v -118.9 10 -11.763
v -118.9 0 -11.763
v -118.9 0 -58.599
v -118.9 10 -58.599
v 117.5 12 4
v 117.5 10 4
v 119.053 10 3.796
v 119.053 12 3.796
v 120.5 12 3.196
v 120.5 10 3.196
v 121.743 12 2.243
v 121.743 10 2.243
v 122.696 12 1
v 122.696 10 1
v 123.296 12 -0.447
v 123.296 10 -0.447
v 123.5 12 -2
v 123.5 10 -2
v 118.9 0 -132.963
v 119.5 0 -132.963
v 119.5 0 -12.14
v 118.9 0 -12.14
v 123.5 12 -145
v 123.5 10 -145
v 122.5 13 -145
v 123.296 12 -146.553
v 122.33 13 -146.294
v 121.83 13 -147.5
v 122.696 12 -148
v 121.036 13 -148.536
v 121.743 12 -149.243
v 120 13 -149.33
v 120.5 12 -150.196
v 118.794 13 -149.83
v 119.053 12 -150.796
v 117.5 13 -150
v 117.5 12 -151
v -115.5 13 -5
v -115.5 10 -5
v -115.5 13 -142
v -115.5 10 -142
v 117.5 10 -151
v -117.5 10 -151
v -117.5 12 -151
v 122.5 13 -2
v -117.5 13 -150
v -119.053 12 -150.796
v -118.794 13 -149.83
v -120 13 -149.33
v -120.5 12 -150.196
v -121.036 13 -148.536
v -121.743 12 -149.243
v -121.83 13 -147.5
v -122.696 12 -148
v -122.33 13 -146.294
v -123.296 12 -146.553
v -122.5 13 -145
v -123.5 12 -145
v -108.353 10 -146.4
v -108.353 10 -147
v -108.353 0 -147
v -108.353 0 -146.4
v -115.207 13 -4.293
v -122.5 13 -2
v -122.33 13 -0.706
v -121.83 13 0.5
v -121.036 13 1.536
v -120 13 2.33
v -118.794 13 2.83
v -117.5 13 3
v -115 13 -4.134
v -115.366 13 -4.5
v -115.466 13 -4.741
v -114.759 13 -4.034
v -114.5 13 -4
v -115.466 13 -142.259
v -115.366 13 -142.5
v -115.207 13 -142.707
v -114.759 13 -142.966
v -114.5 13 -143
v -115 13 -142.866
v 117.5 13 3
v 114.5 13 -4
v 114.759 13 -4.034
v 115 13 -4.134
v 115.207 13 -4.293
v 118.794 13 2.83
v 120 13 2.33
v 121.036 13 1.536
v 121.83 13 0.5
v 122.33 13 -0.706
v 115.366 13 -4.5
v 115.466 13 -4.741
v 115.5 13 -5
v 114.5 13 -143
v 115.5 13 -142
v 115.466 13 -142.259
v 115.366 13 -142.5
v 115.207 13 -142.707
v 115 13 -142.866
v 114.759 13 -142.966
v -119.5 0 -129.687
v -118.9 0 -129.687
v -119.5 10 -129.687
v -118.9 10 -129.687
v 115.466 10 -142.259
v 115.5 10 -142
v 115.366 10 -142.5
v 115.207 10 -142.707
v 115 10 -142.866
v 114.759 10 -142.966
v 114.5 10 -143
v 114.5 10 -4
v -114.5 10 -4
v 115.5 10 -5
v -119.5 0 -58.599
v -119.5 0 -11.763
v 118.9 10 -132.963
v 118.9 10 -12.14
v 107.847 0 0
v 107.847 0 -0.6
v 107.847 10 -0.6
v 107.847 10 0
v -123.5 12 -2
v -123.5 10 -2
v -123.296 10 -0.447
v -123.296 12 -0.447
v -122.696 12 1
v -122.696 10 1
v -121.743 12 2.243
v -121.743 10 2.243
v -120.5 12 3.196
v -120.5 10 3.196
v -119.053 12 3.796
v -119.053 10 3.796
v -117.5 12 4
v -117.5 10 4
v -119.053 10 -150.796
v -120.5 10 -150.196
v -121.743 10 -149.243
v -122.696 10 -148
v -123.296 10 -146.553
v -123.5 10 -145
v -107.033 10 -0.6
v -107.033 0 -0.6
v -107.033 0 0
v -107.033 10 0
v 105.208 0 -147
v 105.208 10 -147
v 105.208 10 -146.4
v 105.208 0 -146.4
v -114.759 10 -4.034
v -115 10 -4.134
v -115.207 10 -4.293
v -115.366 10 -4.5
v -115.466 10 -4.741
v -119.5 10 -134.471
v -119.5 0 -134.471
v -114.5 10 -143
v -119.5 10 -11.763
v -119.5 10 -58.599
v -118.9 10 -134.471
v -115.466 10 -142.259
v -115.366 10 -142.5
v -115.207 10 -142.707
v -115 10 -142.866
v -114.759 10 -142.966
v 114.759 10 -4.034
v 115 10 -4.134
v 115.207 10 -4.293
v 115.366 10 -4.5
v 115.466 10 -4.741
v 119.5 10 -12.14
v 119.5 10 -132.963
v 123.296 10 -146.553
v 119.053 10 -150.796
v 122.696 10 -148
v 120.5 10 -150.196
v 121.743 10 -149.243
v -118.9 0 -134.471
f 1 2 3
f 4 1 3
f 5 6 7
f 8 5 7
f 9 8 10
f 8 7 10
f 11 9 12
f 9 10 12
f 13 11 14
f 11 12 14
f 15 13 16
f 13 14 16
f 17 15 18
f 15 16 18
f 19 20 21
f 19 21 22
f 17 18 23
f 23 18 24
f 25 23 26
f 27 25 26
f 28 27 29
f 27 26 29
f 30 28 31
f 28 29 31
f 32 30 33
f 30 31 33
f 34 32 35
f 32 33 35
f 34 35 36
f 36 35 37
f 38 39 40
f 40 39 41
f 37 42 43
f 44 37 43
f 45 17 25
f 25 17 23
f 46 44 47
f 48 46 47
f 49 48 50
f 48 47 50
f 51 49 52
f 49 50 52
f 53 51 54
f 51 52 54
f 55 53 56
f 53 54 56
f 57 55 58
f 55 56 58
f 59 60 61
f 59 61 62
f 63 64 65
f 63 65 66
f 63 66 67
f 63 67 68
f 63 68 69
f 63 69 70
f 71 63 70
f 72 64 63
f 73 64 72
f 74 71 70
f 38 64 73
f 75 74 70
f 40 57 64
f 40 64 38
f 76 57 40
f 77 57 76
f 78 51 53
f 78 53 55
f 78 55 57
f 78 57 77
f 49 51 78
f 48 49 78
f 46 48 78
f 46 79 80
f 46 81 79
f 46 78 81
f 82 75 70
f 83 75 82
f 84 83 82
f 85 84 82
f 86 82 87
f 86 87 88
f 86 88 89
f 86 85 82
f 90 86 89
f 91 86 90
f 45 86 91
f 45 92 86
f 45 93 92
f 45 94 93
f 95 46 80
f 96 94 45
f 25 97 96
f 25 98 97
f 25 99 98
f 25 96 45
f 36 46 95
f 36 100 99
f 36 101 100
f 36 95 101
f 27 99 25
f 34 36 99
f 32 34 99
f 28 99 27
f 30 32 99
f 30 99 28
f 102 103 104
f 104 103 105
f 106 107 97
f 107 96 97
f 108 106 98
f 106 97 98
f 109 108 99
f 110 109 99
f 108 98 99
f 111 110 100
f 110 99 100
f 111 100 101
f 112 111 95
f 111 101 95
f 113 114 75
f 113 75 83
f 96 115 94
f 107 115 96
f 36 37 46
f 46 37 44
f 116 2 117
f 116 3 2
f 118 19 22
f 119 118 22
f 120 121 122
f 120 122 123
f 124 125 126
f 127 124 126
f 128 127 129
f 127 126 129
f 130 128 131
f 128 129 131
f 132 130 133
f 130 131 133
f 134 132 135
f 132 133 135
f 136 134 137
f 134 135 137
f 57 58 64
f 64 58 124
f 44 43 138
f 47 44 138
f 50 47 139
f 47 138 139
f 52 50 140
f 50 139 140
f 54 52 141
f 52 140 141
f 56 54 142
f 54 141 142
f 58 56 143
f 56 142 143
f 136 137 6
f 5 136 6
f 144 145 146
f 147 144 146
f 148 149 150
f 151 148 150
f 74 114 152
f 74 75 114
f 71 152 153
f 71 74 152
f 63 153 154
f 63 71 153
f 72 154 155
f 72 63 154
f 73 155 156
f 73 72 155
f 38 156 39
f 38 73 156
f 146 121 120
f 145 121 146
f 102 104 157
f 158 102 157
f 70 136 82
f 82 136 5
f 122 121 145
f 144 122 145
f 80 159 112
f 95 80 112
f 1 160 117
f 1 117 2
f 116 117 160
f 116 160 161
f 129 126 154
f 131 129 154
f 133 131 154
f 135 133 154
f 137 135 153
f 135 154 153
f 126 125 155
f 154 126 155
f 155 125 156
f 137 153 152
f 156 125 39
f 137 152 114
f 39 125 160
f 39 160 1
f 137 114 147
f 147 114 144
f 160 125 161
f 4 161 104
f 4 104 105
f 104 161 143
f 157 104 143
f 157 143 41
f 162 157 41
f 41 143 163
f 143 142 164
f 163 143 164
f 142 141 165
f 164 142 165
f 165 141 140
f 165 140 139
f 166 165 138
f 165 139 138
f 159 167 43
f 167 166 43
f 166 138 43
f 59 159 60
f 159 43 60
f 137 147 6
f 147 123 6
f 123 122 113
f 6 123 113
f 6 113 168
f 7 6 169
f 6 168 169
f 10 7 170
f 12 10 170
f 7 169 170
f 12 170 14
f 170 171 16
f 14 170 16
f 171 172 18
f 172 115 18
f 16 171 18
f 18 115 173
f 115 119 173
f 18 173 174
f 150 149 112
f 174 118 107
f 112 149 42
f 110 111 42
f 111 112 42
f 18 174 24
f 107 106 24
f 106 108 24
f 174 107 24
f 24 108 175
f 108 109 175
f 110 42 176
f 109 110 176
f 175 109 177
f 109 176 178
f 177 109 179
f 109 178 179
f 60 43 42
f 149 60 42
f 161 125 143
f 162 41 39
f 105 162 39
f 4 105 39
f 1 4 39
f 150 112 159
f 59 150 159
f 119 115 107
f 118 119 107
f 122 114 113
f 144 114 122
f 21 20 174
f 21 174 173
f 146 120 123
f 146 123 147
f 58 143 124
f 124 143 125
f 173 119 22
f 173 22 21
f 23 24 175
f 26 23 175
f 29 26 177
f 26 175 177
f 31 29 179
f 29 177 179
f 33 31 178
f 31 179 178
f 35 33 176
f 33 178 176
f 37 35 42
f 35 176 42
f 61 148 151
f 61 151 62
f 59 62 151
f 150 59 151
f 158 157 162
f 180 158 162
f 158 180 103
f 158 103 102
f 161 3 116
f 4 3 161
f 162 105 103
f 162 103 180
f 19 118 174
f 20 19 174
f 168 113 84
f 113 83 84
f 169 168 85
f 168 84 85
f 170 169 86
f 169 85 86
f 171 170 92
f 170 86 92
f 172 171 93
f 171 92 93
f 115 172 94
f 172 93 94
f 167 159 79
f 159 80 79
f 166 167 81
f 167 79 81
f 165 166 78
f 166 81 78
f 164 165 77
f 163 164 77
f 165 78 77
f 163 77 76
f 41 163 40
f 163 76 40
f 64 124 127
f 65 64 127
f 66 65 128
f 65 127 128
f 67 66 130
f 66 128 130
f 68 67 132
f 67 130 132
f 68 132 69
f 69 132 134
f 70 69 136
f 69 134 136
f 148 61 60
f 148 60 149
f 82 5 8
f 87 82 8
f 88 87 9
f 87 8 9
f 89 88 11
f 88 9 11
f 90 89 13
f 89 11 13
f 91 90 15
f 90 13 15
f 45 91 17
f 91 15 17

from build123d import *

# Parameters (mm, degrees)
EXTRUDE_1_DEPTH          = 10
SKETCH_2_W               = 231
SKETCH_2_H               = 139
EXTRUDE_1_2_DEPTH        = 3
FILLET_1_R               = 1
CHAMFER_1_SIZE           = 1
CUT_EXTRUDE_1_DEPTH      = 287.389594783
CUT_EXTRUDE_1_DEPTH_BACK = 2
SKETCH_3_W               = 71.087717772
SKETCH_3_H               = 10
SKETCH_4_W               = 21.591384664
SKETCH_4_H               = 17.851519678
SKETCH_4_W_2             = 20.271944057
SKETCH_4_H_2             = 16.15289462
SKETCH_4_W_3             = 20.32571751
SKETCH_4_H_3             = 19.635596567
SKETCH_4_W_4             = 22.15685921
SKETCH_4_H_4             = 28.871680817
CUT_EXTRUDE_2_DEPTH      = 10


with BuildPart() as part:
    # 草图1 → Extrude 1 (new body)
    with BuildSketch(Plane(origin=(0, 0, 0), x_dir=(1, 0, 0), z_dir=(0, 1, 0))):
        with BuildLine():
            Line((-117.5, 147), (117.5, 147))
            ThreePointArc((117.5, 147), (118.914213562, 146.414213562), (119.5, 145))
            Line((119.5, 145), (119.5, 2))
            ThreePointArc((119.5, 2), (118.914213562, 0.585786438), (117.5, 0))
            Line((117.5, 0), (-117.5, 0))
            ThreePointArc((-117.5, 0), (-118.914213562, 0.585786438), (-119.5, 2))
            Line((-119.5, 2), (-119.5, 145))
            ThreePointArc((-119.5, 145), (-118.914213562, 146.414213562), (-117.5, 147))
        make_face()
        with BuildLine():
            Line((-117.5, 146.4), (117.5, 146.4))
            ThreePointArc((117.5, 146.4), (118.489949494, 145.989949494), (118.9, 145))
            Line((118.9, 145), (118.9, 2))
            ThreePointArc((118.9, 2), (118.489949494, 1.010050506), (117.5, 0.6))
            Line((117.5, 0.6), (-117.5, 0.6))
            ThreePointArc((-117.5, 0.6), (-118.489949494, 1.010050506), (-118.9, 2))
            Line((-118.9, 2), (-118.9, 145))
            ThreePointArc((-118.9, 145), (-118.489949494, 145.989949494), (-117.5, 146.4))
        make_face(mode=Mode.SUBTRACT)
    extrude(amount=EXTRUDE_1_DEPTH)

    # 草图2 → Extrude 1 2 (add)
    with BuildSketch(Plane(origin=(0, 10, 0), x_dir=(1, 0, 0), z_dir=(0, 1, 0))):
        with BuildLine():
            Line((123.5, 2), (123.5, 145))
            ThreePointArc((123.5, 145), (121.742640687, 149.242640687), (117.5, 151))
            Line((117.5, 151), (-117.5, 151))
            ThreePointArc((-117.5, 151), (-121.742640687, 149.242640687), (-123.5, 145))
            Line((-123.5, 145), (-123.5, 2))
            ThreePointArc((-123.5, 2), (-121.742640687, -2.242640687), (-117.5, -4))
            Line((-117.5, -4), (117.5, -4))
            ThreePointArc((117.5, -4), (121.742640687, -2.242640687), (123.5, 2))
        make_face()
        with Locations((0, 73.5)):
            Rectangle(SKETCH_2_W, SKETCH_2_H, mode=Mode.SUBTRACT)
    extrude(amount=EXTRUDE_1_2_DEPTH)

    # 圆角1
    fillet_1_edges = [part.edges().sort_by_distance(p)[0] for p in [
        (-115.5, 11.5, -4),
        (115.5, 11.5, -4),
        (115.5, 11.5, -143),
        (-115.5, 11.5, -143),
    ]]
    fillet(fillet_1_edges, radius=FILLET_1_R)

    # 倒角1
    chamfer_1_edges = [part.edges().sort_by_distance(p)[0] for p in [
        (121.742640687, 13, -149.242640687),
        (0, 13, -151),
        (-121.742640687, 13, -149.242640687),
        (-123.5, 13, -73.5),
        (-121.742640687, 13, 2.242640687),
        (0, 13, 4),
        (121.742640687, 13, 2.242640687),
        (123.5, 13, -73.5),
    ]]
    chamfer(chamfer_1_edges, length=CHAMFER_1_SIZE)

    # 草图3 → 切除-拉伸1 (cut, two sides: drawn at the far end of the back side and taken through both)
    with BuildSketch(Plane.ZY.offset(119.5).offset(-CUT_EXTRUDE_1_DEPTH_BACK)):
        with Locations((-94.14273439, 5)):
            Rectangle(SKETCH_3_W, SKETCH_3_H)
    extrude(amount=CUT_EXTRUDE_1_DEPTH + CUT_EXTRUDE_1_DEPTH_BACK, mode=Mode.SUBTRACT)

    # 草图4 → 切除-拉伸2 (cut)
    with BuildSketch(Plane.XZ):
        with Locations((-117.828855159, -2.837454771)):
            Rectangle(SKETCH_4_W, SKETCH_4_H)
        with Locations((-118.488575463, -142.547638379)):
            Rectangle(SKETCH_4_W_2, SKETCH_4_H_2)
        with Locations((115.371142154, -142.781057231)):
            Rectangle(SKETCH_4_W_3, SKETCH_4_H_3)
        with Locations((118.925594218, 2.295642768)):
            Rectangle(SKETCH_4_W_4, SKETCH_4_H_4)
    extrude(amount=-CUT_EXTRUDE_2_DEPTH, mode=Mode.SUBTRACT)


solid = part.part
